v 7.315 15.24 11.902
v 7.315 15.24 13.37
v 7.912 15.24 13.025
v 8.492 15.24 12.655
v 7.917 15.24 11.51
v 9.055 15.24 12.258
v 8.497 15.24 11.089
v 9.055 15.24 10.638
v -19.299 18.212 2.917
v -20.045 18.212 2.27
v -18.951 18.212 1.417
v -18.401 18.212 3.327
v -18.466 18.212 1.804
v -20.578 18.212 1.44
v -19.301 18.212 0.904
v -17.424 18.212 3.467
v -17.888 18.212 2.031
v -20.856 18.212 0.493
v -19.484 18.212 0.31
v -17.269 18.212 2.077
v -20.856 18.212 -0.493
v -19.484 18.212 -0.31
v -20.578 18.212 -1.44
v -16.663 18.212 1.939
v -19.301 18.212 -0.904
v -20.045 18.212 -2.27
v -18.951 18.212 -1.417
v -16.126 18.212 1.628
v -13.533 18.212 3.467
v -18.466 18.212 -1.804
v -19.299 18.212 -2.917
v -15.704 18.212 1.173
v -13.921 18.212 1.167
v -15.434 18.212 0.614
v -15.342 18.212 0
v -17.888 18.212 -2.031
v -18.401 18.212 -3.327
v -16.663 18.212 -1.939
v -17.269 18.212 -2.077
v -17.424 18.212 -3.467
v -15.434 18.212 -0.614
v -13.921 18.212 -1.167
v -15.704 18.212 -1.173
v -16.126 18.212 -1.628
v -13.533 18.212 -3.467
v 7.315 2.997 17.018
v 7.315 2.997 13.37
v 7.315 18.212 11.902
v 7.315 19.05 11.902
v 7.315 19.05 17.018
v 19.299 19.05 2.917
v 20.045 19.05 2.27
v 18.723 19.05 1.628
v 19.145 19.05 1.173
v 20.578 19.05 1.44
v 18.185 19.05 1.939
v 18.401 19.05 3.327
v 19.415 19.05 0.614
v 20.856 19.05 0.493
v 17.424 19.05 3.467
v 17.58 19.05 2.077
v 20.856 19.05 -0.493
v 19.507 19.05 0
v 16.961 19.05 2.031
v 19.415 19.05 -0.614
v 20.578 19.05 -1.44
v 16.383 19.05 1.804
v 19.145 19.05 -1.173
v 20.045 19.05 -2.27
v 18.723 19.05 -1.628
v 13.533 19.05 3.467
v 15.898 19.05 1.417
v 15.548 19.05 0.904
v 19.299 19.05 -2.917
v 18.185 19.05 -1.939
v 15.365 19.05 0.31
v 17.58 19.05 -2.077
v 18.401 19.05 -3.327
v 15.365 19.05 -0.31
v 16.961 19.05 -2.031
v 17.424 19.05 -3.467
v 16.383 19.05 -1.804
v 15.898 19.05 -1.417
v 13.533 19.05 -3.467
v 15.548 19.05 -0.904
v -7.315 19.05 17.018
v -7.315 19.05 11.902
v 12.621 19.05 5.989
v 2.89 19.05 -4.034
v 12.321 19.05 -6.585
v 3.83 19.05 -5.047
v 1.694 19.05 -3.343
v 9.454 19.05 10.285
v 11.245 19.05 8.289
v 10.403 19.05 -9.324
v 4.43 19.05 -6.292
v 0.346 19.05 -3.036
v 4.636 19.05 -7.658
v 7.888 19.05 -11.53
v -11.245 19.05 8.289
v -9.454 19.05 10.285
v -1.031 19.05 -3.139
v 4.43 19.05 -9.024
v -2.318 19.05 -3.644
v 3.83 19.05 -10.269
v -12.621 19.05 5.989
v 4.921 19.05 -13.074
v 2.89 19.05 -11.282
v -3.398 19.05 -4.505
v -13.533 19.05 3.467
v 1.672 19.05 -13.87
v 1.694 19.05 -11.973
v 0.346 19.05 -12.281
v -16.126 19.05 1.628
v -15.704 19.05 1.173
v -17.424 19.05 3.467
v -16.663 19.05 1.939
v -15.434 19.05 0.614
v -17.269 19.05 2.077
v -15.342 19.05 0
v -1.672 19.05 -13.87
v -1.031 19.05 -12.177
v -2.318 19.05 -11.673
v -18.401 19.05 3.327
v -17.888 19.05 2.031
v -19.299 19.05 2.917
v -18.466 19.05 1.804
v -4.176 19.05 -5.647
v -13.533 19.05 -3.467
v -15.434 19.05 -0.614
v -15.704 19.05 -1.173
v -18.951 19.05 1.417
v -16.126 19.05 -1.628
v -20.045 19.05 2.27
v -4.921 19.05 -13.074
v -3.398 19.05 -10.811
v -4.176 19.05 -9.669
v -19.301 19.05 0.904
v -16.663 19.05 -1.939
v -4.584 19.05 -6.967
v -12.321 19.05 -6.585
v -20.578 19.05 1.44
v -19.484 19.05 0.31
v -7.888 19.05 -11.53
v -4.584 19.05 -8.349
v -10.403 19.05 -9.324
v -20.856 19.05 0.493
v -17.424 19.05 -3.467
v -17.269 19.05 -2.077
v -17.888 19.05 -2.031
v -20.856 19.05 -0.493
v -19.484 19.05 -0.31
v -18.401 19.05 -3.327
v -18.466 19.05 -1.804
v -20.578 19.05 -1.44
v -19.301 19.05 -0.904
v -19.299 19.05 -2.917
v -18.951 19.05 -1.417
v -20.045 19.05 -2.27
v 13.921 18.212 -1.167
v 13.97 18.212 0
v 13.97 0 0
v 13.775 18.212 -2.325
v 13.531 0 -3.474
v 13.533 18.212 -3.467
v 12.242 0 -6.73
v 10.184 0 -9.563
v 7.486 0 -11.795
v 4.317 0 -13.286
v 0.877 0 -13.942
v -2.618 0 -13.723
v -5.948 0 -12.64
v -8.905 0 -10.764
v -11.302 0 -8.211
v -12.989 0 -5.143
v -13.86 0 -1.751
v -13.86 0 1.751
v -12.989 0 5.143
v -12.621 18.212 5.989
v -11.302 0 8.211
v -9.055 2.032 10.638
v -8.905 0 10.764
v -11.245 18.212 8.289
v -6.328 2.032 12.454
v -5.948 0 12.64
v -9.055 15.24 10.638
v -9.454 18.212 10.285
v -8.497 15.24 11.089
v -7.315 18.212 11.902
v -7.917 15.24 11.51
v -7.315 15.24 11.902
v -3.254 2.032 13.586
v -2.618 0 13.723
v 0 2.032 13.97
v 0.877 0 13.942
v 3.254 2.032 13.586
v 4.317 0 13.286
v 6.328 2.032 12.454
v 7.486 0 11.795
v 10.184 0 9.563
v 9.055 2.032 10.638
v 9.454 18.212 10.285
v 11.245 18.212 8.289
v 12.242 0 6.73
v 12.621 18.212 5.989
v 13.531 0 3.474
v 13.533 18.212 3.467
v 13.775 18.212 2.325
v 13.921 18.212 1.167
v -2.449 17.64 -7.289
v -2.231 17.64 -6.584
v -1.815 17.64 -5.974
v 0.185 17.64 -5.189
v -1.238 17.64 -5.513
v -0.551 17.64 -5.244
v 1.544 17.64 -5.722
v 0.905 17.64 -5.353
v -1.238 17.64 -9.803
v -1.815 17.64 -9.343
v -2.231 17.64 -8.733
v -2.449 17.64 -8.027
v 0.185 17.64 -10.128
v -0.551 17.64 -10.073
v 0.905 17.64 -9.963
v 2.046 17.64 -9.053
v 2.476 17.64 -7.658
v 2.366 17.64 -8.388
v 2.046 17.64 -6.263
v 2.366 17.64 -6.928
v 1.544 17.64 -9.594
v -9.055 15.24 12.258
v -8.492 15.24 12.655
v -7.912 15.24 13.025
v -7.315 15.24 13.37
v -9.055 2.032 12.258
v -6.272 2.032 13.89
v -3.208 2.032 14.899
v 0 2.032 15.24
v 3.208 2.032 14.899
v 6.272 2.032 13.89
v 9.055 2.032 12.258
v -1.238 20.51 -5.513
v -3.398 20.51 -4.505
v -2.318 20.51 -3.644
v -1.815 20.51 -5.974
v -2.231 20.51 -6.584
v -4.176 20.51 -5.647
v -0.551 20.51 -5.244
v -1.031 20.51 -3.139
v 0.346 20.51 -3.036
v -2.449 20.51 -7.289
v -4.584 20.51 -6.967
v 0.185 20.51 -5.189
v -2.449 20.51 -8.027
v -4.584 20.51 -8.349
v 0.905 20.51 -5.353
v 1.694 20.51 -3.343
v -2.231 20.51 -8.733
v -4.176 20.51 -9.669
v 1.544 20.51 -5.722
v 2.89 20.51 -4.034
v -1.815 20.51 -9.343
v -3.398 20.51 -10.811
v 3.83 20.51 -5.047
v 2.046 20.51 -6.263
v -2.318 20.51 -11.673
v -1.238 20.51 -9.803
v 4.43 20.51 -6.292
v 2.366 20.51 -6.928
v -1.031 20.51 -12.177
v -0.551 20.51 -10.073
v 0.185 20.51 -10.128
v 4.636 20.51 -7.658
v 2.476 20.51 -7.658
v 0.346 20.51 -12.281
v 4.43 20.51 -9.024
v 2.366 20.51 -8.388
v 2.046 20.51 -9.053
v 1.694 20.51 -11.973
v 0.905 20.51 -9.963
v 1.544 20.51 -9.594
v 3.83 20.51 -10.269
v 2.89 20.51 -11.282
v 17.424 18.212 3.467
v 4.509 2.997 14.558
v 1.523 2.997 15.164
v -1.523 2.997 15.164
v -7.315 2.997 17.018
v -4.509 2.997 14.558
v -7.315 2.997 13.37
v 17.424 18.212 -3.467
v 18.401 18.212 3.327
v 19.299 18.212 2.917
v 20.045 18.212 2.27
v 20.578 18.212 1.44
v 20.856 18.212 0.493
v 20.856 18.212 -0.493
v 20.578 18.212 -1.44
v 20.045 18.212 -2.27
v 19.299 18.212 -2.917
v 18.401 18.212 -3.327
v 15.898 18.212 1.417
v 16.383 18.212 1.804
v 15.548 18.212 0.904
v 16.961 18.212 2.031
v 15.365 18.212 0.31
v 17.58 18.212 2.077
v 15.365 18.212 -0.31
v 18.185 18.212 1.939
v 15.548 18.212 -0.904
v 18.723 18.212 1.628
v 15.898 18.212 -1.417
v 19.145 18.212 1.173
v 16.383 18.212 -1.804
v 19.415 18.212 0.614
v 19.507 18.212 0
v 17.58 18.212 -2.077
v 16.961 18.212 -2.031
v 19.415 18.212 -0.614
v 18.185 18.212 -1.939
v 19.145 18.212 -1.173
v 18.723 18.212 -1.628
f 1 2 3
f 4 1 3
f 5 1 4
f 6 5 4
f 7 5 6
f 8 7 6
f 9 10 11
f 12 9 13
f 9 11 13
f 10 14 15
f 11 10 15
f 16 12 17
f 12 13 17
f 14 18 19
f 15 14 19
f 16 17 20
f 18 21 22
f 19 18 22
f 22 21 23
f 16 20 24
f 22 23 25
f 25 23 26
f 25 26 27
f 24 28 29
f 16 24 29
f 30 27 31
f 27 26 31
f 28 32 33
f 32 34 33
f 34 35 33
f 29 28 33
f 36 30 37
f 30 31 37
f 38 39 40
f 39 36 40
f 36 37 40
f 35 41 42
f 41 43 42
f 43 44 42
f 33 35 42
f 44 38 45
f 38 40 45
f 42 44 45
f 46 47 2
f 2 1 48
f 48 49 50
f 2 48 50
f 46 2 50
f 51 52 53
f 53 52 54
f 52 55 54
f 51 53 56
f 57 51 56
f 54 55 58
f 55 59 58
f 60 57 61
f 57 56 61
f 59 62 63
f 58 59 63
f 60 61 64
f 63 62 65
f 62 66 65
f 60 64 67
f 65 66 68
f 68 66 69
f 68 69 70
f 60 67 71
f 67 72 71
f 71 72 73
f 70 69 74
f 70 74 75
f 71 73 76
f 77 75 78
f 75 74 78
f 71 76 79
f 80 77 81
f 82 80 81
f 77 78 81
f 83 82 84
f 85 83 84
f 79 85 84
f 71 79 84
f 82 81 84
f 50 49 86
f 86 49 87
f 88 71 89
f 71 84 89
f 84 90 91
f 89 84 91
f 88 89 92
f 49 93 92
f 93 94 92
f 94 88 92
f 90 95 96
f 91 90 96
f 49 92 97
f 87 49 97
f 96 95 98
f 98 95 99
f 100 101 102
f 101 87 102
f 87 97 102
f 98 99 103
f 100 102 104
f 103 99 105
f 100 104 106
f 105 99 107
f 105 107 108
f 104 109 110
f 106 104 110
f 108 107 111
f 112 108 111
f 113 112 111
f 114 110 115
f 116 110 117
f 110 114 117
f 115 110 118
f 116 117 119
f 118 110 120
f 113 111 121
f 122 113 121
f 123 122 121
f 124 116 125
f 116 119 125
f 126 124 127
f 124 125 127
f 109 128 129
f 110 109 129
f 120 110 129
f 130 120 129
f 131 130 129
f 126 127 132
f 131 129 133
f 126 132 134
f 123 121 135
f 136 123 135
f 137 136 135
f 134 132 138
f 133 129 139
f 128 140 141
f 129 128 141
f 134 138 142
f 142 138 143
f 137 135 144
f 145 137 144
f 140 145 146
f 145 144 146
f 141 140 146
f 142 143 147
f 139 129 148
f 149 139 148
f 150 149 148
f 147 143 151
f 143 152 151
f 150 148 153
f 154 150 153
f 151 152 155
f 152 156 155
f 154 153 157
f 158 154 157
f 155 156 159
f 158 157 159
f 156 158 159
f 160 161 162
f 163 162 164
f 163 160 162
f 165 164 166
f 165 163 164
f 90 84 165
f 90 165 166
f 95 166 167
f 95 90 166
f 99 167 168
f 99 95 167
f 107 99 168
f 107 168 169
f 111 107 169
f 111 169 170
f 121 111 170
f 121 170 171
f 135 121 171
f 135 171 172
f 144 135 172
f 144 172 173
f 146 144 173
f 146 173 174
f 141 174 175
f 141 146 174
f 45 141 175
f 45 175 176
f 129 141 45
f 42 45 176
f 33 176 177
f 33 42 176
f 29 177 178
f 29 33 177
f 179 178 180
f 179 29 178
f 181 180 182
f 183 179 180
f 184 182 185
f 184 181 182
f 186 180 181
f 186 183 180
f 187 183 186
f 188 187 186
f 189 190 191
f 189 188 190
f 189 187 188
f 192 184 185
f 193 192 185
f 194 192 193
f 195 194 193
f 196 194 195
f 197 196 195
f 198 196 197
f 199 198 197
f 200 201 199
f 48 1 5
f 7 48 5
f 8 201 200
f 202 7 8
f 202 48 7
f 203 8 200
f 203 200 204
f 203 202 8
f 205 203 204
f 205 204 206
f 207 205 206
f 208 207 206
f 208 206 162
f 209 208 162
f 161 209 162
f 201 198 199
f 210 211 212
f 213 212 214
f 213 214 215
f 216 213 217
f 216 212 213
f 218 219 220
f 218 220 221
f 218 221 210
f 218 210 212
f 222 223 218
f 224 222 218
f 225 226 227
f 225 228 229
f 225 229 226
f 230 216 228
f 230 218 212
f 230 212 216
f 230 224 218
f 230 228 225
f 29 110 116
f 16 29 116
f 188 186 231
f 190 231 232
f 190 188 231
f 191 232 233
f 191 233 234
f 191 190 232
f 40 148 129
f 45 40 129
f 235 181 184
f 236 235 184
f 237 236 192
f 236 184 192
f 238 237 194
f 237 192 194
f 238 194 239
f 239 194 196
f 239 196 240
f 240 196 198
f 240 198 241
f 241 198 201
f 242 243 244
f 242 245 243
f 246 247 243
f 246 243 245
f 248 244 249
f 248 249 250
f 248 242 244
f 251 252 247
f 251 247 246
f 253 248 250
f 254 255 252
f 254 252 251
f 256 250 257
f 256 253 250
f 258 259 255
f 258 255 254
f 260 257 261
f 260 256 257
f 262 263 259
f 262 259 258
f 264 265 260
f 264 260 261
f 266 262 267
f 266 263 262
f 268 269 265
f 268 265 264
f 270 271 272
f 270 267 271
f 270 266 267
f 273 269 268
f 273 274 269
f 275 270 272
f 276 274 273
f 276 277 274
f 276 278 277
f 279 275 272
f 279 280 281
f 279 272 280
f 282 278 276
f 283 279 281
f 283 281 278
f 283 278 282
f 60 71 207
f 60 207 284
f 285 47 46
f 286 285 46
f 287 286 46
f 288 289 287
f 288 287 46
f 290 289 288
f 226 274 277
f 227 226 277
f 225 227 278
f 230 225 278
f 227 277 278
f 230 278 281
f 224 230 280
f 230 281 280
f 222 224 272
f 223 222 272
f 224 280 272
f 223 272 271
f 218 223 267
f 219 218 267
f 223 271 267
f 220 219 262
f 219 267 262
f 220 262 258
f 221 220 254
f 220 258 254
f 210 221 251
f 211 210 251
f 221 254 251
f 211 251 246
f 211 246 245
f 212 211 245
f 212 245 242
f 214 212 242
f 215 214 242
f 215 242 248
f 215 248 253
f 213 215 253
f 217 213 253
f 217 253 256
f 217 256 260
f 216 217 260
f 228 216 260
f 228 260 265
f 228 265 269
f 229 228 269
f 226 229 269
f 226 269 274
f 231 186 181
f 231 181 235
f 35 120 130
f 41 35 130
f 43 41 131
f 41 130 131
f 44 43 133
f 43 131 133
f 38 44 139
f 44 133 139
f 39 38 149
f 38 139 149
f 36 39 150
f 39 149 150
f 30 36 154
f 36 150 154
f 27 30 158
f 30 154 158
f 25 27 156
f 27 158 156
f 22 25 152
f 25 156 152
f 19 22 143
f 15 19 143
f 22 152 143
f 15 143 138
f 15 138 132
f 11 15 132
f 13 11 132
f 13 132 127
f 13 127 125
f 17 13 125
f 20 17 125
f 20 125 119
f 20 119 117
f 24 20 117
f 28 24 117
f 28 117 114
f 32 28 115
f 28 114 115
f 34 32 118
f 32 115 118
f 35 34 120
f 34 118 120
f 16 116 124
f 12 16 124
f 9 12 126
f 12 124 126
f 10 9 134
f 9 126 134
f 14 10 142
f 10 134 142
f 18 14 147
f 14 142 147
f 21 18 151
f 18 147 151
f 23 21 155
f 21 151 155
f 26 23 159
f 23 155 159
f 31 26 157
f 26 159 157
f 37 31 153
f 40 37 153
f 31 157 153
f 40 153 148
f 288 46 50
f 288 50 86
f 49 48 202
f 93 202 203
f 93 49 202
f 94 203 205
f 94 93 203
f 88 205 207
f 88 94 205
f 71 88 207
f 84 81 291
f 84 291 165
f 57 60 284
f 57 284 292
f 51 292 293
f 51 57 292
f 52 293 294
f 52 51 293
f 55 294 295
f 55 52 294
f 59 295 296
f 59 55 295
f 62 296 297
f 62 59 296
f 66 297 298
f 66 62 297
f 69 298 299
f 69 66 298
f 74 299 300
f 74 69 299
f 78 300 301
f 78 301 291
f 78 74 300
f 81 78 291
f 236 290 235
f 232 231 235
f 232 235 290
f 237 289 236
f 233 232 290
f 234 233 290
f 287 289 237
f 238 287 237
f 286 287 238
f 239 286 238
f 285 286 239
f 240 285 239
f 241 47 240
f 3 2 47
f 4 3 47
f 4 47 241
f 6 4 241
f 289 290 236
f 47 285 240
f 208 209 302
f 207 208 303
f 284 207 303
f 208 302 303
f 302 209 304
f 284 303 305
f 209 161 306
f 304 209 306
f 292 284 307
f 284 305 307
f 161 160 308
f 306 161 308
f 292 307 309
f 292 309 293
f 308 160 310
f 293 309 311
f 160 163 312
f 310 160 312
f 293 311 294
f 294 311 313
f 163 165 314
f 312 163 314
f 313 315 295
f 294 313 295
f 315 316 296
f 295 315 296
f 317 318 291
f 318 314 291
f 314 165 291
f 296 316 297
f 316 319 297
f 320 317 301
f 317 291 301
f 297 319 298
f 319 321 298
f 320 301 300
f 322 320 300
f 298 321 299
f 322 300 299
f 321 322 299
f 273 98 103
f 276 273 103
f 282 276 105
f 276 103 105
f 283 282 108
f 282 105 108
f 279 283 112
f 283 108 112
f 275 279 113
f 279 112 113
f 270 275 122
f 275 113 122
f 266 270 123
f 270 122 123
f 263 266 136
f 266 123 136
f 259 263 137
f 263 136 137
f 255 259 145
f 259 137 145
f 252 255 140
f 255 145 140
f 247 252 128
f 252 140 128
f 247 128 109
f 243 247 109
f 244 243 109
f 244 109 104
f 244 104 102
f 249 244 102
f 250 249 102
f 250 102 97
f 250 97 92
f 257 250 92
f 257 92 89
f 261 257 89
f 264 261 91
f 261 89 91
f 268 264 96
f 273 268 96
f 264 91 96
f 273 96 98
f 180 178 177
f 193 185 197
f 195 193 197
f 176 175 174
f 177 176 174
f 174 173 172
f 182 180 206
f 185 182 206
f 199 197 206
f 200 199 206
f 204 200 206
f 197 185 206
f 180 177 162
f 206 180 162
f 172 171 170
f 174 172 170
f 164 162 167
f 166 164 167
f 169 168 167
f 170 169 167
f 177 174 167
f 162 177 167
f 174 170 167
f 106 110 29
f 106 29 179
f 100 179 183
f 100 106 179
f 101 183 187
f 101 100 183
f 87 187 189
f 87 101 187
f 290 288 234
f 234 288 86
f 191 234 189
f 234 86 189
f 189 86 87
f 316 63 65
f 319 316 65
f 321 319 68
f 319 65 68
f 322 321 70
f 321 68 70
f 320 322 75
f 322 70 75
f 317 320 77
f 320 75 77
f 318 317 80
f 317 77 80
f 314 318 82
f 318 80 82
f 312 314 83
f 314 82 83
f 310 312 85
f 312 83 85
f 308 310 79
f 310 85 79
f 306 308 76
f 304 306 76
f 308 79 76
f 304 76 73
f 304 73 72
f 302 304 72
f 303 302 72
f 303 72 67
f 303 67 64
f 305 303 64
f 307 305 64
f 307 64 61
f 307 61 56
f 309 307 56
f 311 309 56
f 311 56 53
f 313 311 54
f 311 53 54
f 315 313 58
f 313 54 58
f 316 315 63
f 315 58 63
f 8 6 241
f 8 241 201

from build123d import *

# Parameters (mm, degrees)
SKETCH1_R           = 13.97
BOSS_EXTRUDE1_DEPTH = 19.05
SKETCH2_R           = 4.6355
BOSS_EXTRUDE2_DEPTH = 1.4605
SKETCH3_R           = 2.4765
BOSS_EXTRUDE3_DEPTH = 7.8232
CUT_EXTRUDE1_DEPTH  = 6.2611
SKETCH6_R           = 13.97
SKETCH6_R_2         = 2.0828
BOSS_EXTRUDE4_DEPTH = 0.8382
BOSS_EXTRUDE5_DEPTH = 16.0528
BOSS_EXTRUDE6_DEPTH = 13.208
SKETCH9_R           = 2.4765
CUT_EXTRUDE2_DEPTH  = 10.6934


with BuildPart() as part:
    # Sketch1 → Boss-Extrude1 (new body)
    with BuildSketch(Plane(origin=(0, 0, 0), x_dir=(1, 0, 0), z_dir=(0, 1, 0))):
        Circle(SKETCH1_R)
    extrude(amount=BOSS_EXTRUDE1_DEPTH)

    # Sketch2 → Boss-Extrude2 (add)
    with BuildSketch(Plane(origin=(0, 19.05, 0), x_dir=(1, 0, 0), z_dir=(0, 1, 0))):
        with Locations((0, 7.6581)):
            Circle(SKETCH2_R)
    extrude(amount=BOSS_EXTRUDE2_DEPTH)

    # Sketch3 → Boss-Extrude3 (add)
    with BuildSketch(Plane(origin=(0, 20.5105, 0), x_dir=(1, 0, 0), z_dir=(0, 1, 0))):
        with Locations((0, 7.6581)):
            Circle(SKETCH3_R)
    extrude(amount=BOSS_EXTRUDE3_DEPTH)

    # Sketch5 → Cut-Extrude1 (cut)
    with BuildSketch(Plane(origin=(0, 28.3337, 0), x_dir=(1, 0, 0), z_dir=(0, 1, 0))):
        with BuildLine():
            ThreePointArc((1.999998, 9.1186), (0, 10.1346), (-1.999998, 9.1186))
            Line((-1.999998, 9.1186), (1.999998, 9.1186))
        make_face()
        with BuildLine():
            Line((1.999998, 6.1976), (-1.999998, 6.1976))
            ThreePointArc((-1.999998, 6.1976), (0, 5.1816), (1.999998, 6.1976))
        make_face()
    extrude(amount=-CUT_EXTRUDE1_DEPTH, mode=Mode.SUBTRACT)

    # Sketch6 → Boss-Extrude4 (add)
    with BuildSketch(Plane(origin=(0, 19.05, 0), x_dir=(1, 0, 0), z_dir=(0, 1, 0))):
        Circle(SKETCH6_R)
        with BuildLine():
            Line((-17.4244, 3.4671), (-13.532927163, 3.4671))
            ThreePointArc((-13.532927163, 3.4671), (-13.97, 0), (-13.532927163, -3.4671))
            Line((-13.532927163, -3.4671), (-17.4244, -3.4671))
            ThreePointArc((-17.4244, -3.4671), (-20.8915, 0), (-17.4244, 3.4671))
        make_face()
        with Locations((-17.4244, 0)):
            Circle(SKETCH6_R_2, mode=Mode.SUBTRACT)
        with BuildLine():
            Line((17.4244, 3.4671), (13.532927163, 3.4671))
            ThreePointArc((13.532927163, 3.4671), (13.97, 0), (13.532927163, -3.4671))
            Line((13.532927163, -3.4671), (17.4244, -3.4671))
            ThreePointArc((17.4244, -3.4671), (20.8915, 0), (17.4244, 3.4671))
        make_face()
        with Locations((17.4244, 0)):
            Circle(SKETCH6_R_2, mode=Mode.SUBTRACT)
    extrude(amount=-BOSS_EXTRUDE4_DEPTH)

    # Sketch7 → Boss-Extrude5 (add)
    with BuildSketch(Plane(origin=(0, 19.05, 0), x_dir=(1, 0, 0), z_dir=(0, 1, 0))):
        with BuildLine():
            Line((7.3152, -17.018), (-7.3152, -17.018))
            Line((-7.3152, -17.018), (-7.3152, -11.901627996))
            ThreePointArc((-7.3152, -11.901627996), (0, -13.97), (7.3152, -11.901627996))
            Line((7.3152, -11.901627996), (7.3152, -17.018))
        make_face()
    extrude(amount=-BOSS_EXTRUDE5_DEPTH)

    # Sketch8 → Boss-Extrude6 (add)
    with BuildSketch(Plane(origin=(0, 15.24, 0), x_dir=(1, 0, 0), z_dir=(0, 1, 0))):
        with BuildLine():
            Line((-9.0551, -10.637953938), (-9.0551, -12.258171315))
            ThreePointArc((-9.0551, -12.258171315), (0, -15.24), (9.0551, -12.258171315))
            Line((9.0551, -12.258171315), (9.0551, -10.637953938))
            ThreePointArc((9.0551, -10.637953938), (0, -13.97), (-9.0551, -10.637953938))
        make_face()
    extrude(amount=-BOSS_EXTRUDE6_DEPTH)

    # Sketch9 → Cut-Extrude2 (cut)
    with BuildSketch(Plane(origin=(0, 28.3337, 0), x_dir=(1, 0, 0), z_dir=(0, 1, 0))):
        with Locations((0, 7.6581)):
            Circle(SKETCH9_R)
    extrude(amount=-CUT_EXTRUDE2_DEPTH, mode=Mode.SUBTRACT)


solid = part.part
